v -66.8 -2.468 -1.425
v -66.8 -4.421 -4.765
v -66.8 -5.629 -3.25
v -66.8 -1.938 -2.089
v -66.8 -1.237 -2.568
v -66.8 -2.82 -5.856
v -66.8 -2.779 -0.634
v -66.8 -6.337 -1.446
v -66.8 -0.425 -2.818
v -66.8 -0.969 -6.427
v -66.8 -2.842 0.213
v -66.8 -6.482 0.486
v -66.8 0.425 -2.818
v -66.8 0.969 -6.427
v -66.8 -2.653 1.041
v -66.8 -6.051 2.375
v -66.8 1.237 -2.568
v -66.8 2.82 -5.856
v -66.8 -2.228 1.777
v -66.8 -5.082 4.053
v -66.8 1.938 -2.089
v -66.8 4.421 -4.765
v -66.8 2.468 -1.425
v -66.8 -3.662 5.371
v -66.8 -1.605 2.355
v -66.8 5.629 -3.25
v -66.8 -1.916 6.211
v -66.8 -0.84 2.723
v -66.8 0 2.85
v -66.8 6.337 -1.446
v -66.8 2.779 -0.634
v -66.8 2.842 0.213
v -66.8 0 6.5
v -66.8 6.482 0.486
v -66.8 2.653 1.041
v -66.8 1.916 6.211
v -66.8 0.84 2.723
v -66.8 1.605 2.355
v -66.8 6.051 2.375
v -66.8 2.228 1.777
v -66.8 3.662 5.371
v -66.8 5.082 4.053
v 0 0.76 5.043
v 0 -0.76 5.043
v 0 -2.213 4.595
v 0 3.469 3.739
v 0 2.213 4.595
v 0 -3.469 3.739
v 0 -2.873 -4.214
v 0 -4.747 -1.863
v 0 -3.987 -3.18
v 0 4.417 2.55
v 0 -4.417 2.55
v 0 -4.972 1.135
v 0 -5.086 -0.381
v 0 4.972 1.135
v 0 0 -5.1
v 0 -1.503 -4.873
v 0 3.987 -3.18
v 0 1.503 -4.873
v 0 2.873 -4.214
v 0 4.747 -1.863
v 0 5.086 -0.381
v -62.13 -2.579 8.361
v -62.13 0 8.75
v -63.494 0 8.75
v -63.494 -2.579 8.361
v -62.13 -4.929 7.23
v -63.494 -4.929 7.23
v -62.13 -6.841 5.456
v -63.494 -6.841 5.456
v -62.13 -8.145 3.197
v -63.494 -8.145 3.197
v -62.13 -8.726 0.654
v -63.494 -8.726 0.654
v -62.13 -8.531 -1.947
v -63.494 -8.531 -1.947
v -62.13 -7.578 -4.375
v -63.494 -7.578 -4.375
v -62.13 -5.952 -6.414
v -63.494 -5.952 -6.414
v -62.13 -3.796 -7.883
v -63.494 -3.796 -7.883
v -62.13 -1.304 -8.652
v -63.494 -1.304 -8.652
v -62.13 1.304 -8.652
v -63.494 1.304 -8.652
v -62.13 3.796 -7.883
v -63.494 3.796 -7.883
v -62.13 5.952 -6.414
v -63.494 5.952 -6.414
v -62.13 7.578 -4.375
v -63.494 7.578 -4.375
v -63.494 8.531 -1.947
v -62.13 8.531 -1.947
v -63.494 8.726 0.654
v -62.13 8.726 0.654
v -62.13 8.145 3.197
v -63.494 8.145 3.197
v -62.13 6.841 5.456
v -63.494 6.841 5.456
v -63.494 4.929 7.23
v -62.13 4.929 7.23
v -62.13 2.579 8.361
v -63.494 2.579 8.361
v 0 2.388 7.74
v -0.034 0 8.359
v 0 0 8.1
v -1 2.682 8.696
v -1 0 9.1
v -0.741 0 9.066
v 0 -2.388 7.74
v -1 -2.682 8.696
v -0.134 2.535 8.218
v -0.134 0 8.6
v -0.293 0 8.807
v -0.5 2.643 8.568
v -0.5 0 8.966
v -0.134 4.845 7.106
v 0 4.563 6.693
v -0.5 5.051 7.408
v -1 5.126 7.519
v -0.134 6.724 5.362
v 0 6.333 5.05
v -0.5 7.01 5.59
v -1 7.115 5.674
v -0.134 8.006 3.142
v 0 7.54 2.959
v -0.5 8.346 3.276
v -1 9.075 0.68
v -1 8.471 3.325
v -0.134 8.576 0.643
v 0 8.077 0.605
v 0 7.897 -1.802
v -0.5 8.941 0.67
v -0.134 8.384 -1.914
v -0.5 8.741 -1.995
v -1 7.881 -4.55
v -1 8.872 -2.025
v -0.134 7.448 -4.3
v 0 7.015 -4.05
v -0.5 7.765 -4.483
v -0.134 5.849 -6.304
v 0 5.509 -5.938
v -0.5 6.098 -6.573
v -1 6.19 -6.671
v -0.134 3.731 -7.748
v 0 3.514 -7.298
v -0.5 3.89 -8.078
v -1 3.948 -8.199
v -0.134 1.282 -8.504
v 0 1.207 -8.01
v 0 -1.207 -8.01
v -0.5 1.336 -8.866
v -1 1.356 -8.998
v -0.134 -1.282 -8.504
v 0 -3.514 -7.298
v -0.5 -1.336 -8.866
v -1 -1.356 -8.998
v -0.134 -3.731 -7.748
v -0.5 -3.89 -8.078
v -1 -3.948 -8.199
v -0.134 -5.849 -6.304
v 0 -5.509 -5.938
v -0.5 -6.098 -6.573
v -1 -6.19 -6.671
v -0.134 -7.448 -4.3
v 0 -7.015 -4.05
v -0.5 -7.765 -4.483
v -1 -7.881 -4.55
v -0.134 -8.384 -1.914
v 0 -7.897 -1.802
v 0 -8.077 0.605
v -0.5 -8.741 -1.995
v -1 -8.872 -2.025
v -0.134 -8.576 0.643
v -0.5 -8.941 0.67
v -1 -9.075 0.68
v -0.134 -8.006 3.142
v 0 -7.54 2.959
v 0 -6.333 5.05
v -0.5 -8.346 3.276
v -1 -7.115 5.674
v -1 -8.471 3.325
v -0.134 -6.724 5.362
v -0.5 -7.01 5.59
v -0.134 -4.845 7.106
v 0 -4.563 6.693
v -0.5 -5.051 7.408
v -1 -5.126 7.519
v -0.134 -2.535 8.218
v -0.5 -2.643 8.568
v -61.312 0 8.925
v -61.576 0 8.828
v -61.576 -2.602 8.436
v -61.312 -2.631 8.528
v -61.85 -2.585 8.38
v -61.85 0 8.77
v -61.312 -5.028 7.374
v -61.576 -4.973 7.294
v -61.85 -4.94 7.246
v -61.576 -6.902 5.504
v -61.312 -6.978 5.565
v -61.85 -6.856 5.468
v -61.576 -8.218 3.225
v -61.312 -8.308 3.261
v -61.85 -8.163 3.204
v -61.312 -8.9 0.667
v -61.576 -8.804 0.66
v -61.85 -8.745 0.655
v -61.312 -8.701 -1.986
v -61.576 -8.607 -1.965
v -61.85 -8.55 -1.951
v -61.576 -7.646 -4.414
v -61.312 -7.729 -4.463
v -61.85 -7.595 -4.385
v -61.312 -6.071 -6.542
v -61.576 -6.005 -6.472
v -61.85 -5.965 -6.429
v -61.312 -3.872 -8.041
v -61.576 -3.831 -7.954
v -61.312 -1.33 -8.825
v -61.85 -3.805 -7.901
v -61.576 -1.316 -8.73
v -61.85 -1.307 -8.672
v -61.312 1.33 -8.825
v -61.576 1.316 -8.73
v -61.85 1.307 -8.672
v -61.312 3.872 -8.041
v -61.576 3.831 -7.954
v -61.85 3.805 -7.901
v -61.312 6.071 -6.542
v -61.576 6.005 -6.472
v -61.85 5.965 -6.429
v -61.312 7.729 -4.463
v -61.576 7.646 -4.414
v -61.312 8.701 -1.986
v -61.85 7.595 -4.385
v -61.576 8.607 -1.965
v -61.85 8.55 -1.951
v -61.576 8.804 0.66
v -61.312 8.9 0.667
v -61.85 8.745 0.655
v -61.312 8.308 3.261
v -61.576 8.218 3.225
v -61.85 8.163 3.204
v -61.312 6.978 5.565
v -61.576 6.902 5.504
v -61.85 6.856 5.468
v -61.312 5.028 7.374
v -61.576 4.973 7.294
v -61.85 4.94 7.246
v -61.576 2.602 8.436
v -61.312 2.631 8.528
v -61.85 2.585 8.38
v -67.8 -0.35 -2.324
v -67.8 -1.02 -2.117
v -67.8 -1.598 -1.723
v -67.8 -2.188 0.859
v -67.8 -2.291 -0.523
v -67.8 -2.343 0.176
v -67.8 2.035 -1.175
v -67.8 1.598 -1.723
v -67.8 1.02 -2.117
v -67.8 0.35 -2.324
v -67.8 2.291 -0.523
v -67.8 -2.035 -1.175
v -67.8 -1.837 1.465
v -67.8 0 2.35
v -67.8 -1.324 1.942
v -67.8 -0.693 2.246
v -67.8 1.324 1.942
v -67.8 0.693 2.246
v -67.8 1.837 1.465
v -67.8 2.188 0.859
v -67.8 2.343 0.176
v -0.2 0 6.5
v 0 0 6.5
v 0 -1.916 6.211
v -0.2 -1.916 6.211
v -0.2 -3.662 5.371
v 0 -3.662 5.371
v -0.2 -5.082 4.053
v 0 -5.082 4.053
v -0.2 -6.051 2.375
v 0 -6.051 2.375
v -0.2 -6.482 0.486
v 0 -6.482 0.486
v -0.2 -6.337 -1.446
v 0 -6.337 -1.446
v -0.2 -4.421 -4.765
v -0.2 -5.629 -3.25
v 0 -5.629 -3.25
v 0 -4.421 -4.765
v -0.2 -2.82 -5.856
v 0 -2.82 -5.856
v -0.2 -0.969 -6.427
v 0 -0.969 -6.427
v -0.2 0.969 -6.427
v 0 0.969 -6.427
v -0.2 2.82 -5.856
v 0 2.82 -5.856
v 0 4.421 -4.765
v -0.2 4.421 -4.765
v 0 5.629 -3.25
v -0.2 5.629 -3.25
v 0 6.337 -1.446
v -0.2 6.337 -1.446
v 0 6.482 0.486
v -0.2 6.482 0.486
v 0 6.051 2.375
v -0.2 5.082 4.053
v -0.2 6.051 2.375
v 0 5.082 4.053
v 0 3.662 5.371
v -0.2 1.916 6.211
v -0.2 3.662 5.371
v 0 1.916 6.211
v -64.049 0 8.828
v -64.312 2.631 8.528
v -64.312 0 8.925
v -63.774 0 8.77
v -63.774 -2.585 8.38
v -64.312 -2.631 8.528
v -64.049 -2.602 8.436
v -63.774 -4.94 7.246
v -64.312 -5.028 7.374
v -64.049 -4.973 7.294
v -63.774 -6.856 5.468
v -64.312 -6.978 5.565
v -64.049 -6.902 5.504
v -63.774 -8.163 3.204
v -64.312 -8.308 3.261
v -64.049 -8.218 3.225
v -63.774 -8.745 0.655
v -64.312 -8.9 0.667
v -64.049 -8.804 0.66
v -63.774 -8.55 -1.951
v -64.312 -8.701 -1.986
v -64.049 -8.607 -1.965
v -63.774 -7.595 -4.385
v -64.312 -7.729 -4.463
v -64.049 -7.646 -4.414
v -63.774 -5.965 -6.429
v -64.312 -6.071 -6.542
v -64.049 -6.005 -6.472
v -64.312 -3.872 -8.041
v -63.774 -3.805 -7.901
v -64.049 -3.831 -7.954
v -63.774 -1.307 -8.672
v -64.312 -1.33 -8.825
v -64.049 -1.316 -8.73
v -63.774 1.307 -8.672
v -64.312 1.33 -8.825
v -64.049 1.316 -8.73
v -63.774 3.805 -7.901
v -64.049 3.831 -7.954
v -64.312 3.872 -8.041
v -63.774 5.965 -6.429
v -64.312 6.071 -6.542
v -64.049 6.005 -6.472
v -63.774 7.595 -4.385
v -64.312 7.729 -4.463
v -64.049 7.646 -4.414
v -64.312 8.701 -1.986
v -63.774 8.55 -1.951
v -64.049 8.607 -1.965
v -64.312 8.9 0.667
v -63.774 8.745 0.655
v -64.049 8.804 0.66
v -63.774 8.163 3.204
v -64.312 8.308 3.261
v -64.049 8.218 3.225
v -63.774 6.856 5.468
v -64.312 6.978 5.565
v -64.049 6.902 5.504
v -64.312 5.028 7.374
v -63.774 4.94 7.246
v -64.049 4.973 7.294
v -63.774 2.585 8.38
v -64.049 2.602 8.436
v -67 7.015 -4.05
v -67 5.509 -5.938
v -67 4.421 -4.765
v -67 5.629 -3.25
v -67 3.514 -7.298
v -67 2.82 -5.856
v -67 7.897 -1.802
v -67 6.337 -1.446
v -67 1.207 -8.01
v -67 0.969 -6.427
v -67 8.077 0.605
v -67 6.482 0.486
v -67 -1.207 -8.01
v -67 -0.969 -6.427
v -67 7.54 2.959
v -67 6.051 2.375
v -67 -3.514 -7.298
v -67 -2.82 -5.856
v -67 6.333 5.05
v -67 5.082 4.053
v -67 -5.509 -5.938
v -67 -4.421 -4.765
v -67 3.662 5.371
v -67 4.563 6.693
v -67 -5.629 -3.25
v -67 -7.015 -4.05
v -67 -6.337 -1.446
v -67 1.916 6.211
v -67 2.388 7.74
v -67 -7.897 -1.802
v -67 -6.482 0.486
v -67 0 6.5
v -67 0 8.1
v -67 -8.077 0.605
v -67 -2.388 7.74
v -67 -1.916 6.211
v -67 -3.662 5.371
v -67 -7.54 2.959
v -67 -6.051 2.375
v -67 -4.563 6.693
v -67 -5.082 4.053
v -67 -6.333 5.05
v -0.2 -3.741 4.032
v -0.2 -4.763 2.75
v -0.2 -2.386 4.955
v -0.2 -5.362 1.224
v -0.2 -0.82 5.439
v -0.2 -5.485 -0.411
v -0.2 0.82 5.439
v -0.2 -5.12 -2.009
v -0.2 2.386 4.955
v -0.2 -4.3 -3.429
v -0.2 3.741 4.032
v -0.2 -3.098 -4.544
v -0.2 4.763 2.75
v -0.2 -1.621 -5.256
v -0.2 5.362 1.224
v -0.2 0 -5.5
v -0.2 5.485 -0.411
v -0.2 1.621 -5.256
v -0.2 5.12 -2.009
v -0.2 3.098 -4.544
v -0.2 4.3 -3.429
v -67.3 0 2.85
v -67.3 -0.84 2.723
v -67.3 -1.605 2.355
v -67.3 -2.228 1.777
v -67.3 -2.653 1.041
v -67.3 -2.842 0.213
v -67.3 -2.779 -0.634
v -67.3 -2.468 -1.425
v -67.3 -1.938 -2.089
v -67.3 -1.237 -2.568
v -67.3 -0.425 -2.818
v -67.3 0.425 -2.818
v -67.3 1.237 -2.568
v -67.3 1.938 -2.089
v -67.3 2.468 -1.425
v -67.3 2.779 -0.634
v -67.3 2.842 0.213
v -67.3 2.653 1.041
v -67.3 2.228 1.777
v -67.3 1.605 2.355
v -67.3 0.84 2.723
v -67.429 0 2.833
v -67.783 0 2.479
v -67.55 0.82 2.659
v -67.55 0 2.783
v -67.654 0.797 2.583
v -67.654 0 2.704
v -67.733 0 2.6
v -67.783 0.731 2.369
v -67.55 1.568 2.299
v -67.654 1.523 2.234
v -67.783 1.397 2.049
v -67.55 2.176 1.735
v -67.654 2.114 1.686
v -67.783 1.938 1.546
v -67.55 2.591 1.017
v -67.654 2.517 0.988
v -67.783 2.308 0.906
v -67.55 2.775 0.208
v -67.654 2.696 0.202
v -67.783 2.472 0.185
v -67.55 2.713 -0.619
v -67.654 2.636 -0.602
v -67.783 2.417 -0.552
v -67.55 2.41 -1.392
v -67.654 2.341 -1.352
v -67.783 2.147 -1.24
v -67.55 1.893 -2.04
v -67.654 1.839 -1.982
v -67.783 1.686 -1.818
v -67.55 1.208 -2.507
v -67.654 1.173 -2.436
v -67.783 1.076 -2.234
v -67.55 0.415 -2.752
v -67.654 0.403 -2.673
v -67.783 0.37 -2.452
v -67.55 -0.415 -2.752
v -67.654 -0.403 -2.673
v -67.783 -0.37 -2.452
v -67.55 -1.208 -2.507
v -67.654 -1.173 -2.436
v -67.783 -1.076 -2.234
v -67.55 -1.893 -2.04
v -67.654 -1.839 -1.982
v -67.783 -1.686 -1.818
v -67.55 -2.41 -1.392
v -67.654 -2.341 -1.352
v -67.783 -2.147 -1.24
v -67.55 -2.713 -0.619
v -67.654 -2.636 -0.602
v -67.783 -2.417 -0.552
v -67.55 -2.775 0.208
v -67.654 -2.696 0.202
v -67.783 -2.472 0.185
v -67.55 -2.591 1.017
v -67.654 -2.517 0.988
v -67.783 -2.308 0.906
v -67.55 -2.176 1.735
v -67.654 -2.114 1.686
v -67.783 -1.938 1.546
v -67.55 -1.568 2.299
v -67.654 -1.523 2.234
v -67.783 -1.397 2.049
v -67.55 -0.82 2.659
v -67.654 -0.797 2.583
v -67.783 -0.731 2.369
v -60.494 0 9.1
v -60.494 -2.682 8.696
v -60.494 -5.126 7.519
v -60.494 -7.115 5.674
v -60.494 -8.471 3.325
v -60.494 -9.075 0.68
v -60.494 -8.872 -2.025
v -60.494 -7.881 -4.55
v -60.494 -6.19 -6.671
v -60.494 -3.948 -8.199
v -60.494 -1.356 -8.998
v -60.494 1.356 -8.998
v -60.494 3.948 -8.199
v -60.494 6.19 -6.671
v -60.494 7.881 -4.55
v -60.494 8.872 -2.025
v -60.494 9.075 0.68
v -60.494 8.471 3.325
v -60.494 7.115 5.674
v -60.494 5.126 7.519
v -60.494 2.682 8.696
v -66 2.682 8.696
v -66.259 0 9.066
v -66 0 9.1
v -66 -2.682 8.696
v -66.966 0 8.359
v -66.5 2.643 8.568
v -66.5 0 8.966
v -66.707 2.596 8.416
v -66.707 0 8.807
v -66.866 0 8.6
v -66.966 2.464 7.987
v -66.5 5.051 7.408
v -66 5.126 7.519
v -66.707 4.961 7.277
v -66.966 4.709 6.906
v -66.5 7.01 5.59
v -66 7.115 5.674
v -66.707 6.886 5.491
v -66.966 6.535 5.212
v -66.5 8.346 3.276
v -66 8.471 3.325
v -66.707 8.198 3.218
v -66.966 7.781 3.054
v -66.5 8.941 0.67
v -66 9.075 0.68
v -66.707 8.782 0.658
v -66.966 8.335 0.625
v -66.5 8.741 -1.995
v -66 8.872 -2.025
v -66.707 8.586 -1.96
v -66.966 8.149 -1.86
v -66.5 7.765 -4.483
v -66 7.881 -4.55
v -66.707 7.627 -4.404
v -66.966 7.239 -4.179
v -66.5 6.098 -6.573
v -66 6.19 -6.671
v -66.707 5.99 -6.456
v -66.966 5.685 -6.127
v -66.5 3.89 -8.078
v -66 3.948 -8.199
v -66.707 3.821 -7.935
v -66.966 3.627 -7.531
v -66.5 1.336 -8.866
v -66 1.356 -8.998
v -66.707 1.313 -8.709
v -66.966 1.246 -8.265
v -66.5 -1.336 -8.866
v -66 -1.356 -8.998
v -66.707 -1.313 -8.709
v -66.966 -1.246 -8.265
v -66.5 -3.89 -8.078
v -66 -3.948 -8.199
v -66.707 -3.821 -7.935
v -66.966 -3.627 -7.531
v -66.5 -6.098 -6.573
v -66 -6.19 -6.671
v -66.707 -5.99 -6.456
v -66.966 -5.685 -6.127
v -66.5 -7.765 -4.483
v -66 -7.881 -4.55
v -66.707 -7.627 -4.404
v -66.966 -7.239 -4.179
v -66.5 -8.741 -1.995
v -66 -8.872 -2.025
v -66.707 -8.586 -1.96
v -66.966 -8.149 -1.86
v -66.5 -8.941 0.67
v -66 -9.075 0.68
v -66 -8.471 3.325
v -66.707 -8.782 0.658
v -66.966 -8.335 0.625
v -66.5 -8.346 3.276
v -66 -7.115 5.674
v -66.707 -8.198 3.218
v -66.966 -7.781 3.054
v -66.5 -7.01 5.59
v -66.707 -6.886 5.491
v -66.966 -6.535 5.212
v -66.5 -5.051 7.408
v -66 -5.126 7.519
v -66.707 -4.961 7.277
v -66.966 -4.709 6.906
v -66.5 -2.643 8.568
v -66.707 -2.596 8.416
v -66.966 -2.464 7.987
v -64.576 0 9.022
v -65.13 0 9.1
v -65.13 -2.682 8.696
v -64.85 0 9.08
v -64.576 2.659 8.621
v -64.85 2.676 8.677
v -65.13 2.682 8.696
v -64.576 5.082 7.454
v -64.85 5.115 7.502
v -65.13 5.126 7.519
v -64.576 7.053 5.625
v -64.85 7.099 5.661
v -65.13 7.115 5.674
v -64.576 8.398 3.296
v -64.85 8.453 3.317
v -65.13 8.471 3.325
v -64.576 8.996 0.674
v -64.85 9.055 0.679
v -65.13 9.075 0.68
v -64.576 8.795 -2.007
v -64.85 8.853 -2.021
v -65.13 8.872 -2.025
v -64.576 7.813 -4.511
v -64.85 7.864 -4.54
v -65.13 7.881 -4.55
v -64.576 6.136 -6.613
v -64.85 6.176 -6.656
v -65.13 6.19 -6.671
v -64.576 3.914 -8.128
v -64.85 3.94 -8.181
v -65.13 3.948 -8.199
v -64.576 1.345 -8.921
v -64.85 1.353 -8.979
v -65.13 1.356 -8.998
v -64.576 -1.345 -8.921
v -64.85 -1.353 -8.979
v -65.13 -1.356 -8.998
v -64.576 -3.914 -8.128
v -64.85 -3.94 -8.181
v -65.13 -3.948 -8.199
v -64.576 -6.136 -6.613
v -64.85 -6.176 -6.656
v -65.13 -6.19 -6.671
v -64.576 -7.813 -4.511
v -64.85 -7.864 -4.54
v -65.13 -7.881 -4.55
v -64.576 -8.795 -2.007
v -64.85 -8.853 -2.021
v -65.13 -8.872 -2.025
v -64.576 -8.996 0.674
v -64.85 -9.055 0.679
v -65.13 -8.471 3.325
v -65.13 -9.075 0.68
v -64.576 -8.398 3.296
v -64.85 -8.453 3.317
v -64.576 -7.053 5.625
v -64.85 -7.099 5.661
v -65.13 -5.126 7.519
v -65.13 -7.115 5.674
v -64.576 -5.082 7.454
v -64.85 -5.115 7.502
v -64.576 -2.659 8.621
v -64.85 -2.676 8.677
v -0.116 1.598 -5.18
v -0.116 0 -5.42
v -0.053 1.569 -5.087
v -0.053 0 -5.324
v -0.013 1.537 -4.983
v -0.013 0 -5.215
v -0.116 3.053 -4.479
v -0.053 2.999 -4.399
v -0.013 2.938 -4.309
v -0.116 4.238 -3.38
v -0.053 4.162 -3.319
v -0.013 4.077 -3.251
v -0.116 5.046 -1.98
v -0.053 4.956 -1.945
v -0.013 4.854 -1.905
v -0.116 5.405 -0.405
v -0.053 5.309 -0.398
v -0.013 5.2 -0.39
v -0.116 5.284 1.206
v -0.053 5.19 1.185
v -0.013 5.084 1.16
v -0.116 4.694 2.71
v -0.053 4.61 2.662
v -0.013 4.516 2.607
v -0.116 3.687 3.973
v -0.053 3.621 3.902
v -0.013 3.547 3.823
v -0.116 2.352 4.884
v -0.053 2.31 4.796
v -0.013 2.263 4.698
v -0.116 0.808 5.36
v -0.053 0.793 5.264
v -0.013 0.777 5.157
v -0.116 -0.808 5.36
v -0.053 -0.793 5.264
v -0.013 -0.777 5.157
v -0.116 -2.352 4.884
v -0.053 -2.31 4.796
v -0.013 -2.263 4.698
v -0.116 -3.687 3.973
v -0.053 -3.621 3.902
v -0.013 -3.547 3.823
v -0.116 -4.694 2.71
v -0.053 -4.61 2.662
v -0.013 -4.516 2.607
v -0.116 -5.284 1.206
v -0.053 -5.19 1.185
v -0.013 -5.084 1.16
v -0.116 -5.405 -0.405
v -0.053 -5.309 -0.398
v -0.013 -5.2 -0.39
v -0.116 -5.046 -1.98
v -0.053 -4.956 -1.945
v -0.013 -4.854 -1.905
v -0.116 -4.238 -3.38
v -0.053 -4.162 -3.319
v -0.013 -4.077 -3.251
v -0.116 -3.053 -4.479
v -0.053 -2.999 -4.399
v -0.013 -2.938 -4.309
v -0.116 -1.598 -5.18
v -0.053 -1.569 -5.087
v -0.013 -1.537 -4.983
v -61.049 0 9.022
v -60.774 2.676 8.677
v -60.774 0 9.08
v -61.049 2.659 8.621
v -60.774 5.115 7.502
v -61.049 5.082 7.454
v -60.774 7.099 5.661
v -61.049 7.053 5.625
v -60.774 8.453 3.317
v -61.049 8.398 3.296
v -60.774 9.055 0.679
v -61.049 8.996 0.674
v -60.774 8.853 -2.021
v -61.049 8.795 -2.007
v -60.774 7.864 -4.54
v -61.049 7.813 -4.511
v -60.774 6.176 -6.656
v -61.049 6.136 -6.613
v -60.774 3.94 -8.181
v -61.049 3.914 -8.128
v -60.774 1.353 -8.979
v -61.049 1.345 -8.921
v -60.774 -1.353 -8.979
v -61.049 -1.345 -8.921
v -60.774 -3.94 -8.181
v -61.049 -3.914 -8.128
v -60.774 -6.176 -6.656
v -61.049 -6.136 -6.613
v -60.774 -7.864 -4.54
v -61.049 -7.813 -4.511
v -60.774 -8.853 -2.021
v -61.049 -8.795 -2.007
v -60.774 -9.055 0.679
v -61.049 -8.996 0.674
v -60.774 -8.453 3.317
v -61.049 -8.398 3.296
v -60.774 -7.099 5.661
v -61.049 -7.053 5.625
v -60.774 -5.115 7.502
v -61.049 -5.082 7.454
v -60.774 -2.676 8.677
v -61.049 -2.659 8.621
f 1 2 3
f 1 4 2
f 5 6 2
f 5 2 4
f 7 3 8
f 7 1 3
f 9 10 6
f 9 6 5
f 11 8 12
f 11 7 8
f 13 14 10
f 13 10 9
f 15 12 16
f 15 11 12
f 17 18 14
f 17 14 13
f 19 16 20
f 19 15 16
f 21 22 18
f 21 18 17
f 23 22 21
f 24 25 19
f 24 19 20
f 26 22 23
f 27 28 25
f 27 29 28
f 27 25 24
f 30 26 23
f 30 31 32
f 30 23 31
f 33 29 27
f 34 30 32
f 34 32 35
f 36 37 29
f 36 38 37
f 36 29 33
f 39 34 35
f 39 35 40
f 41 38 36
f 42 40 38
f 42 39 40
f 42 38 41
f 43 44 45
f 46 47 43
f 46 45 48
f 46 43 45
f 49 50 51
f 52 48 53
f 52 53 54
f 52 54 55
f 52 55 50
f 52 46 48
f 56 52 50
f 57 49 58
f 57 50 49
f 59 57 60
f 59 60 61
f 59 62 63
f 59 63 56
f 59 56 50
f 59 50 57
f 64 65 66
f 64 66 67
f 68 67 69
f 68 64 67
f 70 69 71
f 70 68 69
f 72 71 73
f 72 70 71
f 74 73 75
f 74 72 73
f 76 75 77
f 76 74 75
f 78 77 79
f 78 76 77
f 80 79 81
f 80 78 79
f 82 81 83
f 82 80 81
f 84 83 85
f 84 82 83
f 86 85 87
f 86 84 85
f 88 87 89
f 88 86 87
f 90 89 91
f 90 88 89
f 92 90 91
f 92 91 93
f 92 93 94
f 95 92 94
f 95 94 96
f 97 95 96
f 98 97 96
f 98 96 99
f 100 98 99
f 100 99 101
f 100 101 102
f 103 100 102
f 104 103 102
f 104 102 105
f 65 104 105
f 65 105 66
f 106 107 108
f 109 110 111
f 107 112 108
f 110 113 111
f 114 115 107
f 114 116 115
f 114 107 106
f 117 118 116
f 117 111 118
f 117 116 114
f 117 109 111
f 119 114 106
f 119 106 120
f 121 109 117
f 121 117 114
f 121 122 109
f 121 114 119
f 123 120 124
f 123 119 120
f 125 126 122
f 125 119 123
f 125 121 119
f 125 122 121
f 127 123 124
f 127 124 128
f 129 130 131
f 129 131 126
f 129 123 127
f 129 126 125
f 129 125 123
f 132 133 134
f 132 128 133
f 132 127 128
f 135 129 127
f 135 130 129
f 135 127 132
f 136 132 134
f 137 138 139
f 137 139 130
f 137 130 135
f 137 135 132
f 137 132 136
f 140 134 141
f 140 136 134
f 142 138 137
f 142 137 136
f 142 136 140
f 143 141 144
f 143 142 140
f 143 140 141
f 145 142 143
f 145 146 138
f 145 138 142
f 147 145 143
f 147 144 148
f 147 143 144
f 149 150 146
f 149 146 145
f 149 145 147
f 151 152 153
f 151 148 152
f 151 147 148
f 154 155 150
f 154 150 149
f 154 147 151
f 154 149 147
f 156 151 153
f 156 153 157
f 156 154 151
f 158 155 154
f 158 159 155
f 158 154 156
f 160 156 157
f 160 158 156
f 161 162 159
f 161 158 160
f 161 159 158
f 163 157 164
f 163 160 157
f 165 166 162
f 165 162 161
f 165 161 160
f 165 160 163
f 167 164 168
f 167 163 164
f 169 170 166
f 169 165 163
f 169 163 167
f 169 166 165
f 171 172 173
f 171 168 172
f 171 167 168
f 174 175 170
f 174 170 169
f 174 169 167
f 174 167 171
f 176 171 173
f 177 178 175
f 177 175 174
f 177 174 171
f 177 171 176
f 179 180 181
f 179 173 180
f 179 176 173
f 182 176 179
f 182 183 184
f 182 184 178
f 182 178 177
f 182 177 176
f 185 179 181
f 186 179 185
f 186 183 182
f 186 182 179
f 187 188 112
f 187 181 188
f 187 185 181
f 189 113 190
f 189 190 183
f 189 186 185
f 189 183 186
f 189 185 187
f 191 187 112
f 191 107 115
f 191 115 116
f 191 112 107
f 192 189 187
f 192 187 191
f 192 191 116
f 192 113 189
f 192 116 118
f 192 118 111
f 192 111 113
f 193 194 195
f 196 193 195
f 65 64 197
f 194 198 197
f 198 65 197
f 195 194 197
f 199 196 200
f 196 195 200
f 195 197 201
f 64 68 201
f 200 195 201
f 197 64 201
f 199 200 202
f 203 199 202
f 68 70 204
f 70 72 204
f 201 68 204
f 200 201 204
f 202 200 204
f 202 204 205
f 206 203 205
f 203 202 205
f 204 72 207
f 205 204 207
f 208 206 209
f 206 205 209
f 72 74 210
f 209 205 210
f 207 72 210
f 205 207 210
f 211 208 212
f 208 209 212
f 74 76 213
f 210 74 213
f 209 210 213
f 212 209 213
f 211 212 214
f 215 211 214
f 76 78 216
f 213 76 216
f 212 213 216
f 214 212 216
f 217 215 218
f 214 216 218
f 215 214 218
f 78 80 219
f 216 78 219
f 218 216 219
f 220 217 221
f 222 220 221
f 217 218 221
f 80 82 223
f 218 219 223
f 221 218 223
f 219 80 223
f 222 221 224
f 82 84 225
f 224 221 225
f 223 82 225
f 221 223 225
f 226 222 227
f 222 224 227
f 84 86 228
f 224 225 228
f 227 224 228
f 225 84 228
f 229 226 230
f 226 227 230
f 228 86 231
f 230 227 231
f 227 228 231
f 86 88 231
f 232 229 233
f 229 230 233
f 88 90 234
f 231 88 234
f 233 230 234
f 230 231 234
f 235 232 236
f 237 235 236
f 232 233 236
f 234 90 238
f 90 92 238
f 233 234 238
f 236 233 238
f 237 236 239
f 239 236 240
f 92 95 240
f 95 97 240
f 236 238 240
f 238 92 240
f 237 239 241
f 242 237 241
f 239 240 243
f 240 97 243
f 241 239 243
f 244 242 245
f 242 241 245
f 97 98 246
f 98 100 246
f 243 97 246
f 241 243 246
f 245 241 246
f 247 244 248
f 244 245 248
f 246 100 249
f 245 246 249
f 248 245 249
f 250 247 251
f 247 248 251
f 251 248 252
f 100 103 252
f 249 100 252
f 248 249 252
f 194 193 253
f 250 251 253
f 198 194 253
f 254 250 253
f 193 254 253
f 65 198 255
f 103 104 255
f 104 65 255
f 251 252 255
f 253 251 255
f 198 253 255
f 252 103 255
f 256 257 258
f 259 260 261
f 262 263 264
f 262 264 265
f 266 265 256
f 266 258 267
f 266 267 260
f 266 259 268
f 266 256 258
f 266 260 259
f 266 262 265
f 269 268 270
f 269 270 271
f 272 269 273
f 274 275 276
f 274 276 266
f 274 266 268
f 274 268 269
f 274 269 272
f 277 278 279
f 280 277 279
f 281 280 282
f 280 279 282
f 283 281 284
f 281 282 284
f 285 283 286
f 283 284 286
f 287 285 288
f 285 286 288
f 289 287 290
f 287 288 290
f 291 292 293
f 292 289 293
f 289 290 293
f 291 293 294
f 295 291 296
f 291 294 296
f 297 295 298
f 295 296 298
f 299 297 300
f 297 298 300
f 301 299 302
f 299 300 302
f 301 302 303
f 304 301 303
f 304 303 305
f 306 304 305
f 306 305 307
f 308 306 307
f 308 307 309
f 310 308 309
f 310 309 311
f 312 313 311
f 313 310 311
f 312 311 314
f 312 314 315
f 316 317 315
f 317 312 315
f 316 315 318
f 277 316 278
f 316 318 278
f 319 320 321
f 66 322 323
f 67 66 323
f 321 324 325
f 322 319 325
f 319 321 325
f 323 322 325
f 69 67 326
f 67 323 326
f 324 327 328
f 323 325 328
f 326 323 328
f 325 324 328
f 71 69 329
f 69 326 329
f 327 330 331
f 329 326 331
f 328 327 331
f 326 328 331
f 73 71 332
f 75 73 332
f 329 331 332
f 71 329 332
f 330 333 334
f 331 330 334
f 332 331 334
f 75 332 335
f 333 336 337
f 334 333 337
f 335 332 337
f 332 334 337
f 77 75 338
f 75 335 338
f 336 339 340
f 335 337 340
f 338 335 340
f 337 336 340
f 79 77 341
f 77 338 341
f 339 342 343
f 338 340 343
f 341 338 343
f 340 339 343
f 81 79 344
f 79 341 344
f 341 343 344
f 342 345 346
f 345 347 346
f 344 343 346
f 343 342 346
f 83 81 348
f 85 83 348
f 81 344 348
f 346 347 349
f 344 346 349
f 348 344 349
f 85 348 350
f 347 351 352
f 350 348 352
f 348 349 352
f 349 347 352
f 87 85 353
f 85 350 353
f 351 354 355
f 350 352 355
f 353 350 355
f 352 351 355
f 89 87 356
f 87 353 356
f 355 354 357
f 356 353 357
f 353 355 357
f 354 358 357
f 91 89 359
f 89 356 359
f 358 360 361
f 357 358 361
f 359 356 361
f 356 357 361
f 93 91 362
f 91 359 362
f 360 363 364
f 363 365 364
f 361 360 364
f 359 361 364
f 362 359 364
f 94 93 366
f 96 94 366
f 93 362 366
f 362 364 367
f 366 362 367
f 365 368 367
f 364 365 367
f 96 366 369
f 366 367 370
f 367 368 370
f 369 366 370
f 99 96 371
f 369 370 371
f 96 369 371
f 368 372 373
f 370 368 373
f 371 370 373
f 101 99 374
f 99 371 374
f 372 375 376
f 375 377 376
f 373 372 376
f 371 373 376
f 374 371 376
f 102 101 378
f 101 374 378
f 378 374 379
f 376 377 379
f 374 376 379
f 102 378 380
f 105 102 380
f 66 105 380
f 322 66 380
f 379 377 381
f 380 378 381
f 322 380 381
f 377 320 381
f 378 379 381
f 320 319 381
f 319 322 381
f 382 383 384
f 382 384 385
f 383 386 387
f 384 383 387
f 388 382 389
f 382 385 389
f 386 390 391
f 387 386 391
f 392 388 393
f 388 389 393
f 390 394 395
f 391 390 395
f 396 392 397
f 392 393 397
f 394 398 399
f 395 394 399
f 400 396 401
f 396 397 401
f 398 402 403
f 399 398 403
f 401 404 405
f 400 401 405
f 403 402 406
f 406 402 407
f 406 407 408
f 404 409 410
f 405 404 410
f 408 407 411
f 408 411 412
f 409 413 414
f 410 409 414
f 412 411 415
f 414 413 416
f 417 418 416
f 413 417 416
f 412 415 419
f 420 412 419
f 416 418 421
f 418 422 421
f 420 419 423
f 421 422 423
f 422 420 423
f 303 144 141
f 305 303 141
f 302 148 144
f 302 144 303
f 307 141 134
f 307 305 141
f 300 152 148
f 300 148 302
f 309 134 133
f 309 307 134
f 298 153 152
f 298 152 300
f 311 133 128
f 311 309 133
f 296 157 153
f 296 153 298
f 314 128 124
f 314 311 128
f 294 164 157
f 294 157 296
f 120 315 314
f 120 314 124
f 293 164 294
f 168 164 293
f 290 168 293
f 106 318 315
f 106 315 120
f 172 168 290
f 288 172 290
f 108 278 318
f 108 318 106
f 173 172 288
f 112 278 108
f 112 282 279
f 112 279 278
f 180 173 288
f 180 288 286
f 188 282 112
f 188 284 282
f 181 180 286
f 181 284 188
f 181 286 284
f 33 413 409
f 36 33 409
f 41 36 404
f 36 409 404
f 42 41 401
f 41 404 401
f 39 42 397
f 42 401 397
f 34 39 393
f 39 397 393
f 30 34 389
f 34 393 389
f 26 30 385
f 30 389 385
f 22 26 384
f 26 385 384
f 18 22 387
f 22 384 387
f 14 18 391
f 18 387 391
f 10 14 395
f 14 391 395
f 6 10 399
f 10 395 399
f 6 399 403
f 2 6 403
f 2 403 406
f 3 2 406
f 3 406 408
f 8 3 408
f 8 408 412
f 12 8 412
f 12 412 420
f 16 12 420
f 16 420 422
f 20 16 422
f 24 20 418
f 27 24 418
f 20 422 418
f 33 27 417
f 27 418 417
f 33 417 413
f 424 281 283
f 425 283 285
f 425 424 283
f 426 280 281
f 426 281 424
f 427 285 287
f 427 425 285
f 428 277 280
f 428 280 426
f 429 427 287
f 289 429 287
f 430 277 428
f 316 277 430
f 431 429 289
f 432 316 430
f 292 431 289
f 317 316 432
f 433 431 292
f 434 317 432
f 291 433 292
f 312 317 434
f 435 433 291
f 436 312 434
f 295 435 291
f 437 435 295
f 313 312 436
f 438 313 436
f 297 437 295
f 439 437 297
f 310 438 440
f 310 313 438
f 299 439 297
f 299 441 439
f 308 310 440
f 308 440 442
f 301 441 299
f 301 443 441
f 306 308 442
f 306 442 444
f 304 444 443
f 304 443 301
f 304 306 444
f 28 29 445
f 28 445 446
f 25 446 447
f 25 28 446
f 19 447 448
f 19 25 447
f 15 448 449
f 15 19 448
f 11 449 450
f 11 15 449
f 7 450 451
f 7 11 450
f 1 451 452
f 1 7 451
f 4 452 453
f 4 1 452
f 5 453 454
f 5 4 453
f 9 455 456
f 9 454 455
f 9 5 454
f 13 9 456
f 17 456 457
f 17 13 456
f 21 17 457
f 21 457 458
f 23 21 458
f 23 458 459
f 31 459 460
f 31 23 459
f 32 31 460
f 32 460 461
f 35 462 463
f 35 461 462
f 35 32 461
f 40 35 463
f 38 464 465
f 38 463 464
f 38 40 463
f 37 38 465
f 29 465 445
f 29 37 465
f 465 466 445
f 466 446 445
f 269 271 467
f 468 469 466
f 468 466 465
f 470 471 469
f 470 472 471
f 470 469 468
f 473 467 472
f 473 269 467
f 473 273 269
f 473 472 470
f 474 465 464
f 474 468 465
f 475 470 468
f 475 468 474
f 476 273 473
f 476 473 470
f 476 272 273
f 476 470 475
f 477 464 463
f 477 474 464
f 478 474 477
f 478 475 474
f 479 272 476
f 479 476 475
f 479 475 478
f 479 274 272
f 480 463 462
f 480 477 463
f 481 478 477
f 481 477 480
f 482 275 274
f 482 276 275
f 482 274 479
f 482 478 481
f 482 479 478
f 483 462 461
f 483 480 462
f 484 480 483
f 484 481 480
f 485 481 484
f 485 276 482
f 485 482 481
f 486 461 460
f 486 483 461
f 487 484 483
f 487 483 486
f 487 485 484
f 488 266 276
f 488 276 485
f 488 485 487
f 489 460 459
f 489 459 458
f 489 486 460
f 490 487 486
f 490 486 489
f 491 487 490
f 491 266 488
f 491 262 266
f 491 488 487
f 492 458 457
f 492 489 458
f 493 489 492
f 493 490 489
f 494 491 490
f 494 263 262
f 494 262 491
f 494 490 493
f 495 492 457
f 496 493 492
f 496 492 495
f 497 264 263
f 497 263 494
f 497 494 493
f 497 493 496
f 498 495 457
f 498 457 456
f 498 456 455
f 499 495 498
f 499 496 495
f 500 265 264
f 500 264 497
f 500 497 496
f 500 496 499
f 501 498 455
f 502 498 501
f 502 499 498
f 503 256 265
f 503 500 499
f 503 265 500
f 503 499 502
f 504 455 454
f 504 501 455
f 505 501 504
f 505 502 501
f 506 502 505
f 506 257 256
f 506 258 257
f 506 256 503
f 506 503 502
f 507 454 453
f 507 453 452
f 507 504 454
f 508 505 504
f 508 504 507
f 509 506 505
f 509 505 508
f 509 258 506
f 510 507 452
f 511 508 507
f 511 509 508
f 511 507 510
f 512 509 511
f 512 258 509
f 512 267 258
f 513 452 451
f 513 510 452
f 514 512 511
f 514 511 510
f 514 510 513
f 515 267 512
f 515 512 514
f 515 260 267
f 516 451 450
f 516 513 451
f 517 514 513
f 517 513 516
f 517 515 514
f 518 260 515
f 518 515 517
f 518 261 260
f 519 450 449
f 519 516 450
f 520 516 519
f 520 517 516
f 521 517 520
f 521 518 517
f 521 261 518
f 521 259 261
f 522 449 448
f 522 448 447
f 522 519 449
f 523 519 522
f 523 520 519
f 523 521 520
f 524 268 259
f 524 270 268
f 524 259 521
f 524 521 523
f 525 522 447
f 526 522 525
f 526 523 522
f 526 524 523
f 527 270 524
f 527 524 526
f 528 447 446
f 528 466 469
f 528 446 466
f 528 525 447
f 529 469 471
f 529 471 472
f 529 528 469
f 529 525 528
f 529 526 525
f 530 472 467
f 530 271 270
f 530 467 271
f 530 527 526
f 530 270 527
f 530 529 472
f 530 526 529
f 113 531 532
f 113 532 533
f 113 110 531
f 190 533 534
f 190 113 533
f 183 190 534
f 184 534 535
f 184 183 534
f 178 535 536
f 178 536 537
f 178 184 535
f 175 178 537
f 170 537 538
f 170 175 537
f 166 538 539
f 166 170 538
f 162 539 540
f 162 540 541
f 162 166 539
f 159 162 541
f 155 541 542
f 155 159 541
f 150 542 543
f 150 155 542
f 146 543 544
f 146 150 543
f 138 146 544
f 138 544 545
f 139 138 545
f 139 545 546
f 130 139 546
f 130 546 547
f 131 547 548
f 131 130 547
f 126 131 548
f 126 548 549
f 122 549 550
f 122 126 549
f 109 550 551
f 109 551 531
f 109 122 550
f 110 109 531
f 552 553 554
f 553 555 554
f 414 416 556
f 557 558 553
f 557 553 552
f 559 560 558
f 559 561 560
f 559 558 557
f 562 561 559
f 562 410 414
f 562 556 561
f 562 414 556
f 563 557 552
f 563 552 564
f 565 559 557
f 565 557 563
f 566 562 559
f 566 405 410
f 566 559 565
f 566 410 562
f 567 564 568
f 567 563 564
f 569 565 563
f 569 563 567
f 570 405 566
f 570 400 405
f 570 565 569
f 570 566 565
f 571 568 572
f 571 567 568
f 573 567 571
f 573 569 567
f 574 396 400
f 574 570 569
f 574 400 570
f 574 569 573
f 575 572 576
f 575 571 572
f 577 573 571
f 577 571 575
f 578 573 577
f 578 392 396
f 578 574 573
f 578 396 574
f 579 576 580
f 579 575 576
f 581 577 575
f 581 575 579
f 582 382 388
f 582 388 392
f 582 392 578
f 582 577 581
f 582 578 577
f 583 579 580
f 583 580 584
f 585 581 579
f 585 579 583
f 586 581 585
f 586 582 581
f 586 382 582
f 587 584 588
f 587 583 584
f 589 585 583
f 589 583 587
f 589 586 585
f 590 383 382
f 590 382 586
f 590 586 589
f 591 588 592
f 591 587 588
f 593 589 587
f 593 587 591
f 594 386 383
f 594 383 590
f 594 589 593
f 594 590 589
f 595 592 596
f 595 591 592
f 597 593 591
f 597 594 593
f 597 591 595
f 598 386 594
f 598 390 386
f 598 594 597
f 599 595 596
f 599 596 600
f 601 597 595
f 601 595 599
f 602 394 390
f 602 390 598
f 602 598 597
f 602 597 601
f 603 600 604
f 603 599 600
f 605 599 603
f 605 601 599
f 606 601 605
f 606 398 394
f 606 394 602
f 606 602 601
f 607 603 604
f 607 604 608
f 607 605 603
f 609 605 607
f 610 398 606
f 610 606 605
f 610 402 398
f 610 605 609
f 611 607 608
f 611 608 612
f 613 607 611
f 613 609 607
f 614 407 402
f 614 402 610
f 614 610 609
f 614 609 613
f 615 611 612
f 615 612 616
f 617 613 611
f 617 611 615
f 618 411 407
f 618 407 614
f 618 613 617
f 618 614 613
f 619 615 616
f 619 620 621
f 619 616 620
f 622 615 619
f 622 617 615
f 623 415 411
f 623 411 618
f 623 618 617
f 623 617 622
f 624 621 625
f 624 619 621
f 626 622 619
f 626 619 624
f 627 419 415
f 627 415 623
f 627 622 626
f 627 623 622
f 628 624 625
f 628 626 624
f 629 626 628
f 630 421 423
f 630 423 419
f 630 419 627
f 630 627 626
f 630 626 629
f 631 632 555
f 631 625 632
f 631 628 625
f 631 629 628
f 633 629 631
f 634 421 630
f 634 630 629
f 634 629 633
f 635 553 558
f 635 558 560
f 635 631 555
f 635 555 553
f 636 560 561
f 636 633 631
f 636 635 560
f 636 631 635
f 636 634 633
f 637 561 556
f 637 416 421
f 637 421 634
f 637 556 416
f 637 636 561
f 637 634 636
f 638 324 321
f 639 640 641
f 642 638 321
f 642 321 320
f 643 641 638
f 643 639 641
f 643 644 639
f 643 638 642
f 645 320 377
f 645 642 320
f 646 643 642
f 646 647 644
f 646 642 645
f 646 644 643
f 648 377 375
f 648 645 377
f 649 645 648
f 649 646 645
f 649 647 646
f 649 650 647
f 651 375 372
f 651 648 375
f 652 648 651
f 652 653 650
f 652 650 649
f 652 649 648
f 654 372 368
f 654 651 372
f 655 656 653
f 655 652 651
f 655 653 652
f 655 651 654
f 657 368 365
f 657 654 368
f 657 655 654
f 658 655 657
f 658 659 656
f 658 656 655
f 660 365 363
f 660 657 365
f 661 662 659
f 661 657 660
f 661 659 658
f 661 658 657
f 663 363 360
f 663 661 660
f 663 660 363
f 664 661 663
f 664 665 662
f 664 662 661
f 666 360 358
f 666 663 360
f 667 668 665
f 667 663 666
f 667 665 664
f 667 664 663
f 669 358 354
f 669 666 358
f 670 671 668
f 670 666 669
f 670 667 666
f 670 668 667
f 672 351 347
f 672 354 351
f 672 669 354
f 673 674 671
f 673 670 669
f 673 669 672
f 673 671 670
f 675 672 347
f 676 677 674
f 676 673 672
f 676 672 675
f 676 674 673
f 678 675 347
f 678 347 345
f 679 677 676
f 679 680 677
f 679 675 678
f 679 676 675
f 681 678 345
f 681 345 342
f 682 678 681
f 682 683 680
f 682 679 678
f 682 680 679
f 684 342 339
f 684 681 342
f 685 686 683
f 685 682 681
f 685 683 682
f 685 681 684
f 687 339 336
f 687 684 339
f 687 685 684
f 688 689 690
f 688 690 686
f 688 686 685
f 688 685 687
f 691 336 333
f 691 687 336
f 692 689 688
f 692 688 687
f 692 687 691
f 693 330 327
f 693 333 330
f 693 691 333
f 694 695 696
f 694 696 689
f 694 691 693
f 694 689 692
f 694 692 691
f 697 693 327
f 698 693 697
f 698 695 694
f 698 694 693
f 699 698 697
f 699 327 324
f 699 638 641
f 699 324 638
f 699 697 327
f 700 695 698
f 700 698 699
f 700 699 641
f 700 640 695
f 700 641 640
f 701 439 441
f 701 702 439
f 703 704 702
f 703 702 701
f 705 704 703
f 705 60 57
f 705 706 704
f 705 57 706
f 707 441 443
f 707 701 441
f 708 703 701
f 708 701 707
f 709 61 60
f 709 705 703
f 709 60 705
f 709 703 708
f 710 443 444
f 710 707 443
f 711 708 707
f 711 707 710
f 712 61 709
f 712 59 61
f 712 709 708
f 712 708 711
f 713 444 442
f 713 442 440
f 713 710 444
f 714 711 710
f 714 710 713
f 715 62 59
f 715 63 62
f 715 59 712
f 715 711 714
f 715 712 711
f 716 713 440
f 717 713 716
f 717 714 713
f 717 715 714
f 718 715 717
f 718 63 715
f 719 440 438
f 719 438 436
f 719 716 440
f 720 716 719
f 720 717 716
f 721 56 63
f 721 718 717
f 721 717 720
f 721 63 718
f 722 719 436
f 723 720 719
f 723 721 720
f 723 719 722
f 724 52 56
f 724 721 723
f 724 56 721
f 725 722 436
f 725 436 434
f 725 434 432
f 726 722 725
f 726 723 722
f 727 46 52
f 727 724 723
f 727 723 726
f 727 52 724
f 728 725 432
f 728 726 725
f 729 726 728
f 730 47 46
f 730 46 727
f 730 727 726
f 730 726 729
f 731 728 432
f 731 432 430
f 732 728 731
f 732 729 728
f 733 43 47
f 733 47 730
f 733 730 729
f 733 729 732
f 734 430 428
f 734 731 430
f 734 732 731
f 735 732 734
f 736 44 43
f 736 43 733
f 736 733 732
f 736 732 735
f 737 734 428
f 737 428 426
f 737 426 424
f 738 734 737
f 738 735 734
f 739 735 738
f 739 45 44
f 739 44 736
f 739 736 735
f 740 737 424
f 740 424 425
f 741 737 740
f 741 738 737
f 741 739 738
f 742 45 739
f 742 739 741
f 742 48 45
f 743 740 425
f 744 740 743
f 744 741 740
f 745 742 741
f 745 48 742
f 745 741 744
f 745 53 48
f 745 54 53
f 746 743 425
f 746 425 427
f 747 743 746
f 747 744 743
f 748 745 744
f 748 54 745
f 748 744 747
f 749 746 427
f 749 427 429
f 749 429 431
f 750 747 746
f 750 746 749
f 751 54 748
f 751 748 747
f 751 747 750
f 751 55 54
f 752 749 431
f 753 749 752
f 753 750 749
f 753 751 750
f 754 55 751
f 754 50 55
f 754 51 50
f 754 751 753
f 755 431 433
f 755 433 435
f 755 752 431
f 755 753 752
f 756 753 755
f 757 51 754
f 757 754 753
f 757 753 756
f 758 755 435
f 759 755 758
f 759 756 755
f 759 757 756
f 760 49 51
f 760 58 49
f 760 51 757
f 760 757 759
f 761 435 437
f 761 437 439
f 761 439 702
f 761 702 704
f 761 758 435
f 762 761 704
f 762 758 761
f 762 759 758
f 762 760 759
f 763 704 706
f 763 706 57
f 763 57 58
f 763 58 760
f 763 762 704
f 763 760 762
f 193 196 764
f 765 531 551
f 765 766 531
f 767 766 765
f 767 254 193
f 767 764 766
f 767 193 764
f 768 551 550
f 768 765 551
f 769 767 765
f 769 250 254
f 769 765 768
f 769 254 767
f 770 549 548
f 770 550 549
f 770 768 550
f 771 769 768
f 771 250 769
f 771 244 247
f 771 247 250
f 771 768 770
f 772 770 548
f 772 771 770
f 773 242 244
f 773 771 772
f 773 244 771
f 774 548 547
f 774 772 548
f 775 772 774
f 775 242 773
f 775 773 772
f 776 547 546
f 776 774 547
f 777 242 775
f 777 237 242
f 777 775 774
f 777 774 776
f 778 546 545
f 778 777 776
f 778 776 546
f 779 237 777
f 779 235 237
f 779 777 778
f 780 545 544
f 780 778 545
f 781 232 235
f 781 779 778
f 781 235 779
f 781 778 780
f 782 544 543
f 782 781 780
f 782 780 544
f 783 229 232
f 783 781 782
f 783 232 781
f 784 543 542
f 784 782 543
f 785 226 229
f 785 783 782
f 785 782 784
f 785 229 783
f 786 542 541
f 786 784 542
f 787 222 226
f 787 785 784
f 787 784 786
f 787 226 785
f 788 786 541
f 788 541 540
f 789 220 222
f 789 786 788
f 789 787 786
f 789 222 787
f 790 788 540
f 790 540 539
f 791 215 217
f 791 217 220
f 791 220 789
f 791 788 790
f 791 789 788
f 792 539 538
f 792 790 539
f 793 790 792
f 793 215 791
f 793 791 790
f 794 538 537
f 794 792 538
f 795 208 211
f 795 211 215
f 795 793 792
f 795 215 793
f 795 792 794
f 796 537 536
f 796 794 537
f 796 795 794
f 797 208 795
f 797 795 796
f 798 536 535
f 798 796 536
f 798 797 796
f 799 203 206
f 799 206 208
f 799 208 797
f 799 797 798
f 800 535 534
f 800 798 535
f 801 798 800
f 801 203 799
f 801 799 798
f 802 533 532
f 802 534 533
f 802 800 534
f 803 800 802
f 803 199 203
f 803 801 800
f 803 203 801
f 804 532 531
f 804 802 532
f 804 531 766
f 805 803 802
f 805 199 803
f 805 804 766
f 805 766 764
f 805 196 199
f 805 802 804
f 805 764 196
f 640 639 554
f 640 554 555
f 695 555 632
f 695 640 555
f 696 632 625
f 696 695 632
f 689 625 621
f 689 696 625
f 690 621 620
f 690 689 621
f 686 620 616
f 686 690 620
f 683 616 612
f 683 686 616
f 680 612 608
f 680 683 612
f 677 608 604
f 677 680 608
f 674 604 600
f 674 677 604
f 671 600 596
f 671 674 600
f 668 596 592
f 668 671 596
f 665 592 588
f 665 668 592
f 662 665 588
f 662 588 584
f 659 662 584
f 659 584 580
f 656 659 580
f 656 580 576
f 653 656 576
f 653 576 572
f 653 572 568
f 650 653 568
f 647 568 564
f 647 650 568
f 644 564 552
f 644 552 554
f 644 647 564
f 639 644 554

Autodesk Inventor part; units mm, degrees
ref_plane "YZ Plane" through (0, 0, 0) normal (1, 0, 0) x (0, 1, 0)
ref_plane "XZ Plane" through (0, 0, 0) normal (0, 1, 0) x (-1, 0, 0)
sketch "Skizze1" plane through (0, 0, 0) normal (0, 1, 0) x (-1, 0, 0)
  line L0 (0, 0) -> (67, 0)
  line L1 (67, 0) -> (67, 9.1)
  line L2 (67, 9.1) -> (0, 9.1)
  line L3 (0, 9.1) -> (0, 0)
  line L4 (61, 9.1) -> (64, 9.1)
  line L5 (64, 9.1) -> (64, 8.75)
  line L6 (64, 8.75) -> (61, 8.75)
  line L7 (61, 8.75) -> (61, 9.1)
  line L8 (80.4, 0) -> (-13.4, 0) projected
  dimension "d0" = 67
  dimension "d1" = 9.1
  dimension "d2" = 3
  dimension "d3" = 3
  dimension "d4" = 0.35
revolve "Umdrehung1" add sketch "Skizze1" angle 360 about axis through (-10, 0, 0) along (1, 0, 0) contours L3 L2 L7 L6 L5 L1 L0
ref_plane "Arbeitsebene1" through (-33.5, 0, 0) normal (-1, 0, 0) x (0, 0, 1)
fillet "Rundung1" radius 2 4 edges at (-64, 0, -9.1) (-64, 0, -8.75) (-61, 0, -8.75) (-61, 0, -9.1)
fillet "Rundung2" radius 1 2 edges at (-67, 0, -9.1) (0, 0, -9.1)
sketch "Skizze2" plane through (-67, 0, 0) normal (-1, 0, 0) x (0, 0, 1)
  circle A0 centre (0, 0) radius 8.1 projected
  circle A1 centre (0, 0) radius 6.5
  dimension "d8" = 13
extrude "Extrusion1" cut sketch "Skizze2" against normal blind 0.2 contours A1
mirror "Spiegeln1" about plane through (-33.5, 0, 0) normal (-1, 0, 0) of "Extrusion1"
sketch "Skizze3" plane through (-66.8, 0, 0) normal (-1, 0, 0) x (0, 0, 1)
  circle A0 centre (0, 0) radius 6.5 projected
  circle A1 centre (0, 0) radius 2.85
  dimension "d11" = 5.7
extrude "Extrusion2" add sketch "Skizze3" along normal blind 1 contours A1
fillet "Rundung3" radius 0.5 1 edges at (-67.8, 0, -2.85)
sketch "Skizze4" plane through (-0.2, 0, 0) normal (1, 0, 0) x (0, 0, -1)
  circle A0 centre (0, 0) radius 6.5 projected
  circle A1 centre (0, 0) radius 5.5
  dimension "d15" = 1
extrude "Extrusion3" add sketch "Skizze4" along normal blind 0.2 contours A1
fillet "Rundung4" radius 0.5 1 edges at (0, 0, 5.5)
properties part number "accu_18500"
